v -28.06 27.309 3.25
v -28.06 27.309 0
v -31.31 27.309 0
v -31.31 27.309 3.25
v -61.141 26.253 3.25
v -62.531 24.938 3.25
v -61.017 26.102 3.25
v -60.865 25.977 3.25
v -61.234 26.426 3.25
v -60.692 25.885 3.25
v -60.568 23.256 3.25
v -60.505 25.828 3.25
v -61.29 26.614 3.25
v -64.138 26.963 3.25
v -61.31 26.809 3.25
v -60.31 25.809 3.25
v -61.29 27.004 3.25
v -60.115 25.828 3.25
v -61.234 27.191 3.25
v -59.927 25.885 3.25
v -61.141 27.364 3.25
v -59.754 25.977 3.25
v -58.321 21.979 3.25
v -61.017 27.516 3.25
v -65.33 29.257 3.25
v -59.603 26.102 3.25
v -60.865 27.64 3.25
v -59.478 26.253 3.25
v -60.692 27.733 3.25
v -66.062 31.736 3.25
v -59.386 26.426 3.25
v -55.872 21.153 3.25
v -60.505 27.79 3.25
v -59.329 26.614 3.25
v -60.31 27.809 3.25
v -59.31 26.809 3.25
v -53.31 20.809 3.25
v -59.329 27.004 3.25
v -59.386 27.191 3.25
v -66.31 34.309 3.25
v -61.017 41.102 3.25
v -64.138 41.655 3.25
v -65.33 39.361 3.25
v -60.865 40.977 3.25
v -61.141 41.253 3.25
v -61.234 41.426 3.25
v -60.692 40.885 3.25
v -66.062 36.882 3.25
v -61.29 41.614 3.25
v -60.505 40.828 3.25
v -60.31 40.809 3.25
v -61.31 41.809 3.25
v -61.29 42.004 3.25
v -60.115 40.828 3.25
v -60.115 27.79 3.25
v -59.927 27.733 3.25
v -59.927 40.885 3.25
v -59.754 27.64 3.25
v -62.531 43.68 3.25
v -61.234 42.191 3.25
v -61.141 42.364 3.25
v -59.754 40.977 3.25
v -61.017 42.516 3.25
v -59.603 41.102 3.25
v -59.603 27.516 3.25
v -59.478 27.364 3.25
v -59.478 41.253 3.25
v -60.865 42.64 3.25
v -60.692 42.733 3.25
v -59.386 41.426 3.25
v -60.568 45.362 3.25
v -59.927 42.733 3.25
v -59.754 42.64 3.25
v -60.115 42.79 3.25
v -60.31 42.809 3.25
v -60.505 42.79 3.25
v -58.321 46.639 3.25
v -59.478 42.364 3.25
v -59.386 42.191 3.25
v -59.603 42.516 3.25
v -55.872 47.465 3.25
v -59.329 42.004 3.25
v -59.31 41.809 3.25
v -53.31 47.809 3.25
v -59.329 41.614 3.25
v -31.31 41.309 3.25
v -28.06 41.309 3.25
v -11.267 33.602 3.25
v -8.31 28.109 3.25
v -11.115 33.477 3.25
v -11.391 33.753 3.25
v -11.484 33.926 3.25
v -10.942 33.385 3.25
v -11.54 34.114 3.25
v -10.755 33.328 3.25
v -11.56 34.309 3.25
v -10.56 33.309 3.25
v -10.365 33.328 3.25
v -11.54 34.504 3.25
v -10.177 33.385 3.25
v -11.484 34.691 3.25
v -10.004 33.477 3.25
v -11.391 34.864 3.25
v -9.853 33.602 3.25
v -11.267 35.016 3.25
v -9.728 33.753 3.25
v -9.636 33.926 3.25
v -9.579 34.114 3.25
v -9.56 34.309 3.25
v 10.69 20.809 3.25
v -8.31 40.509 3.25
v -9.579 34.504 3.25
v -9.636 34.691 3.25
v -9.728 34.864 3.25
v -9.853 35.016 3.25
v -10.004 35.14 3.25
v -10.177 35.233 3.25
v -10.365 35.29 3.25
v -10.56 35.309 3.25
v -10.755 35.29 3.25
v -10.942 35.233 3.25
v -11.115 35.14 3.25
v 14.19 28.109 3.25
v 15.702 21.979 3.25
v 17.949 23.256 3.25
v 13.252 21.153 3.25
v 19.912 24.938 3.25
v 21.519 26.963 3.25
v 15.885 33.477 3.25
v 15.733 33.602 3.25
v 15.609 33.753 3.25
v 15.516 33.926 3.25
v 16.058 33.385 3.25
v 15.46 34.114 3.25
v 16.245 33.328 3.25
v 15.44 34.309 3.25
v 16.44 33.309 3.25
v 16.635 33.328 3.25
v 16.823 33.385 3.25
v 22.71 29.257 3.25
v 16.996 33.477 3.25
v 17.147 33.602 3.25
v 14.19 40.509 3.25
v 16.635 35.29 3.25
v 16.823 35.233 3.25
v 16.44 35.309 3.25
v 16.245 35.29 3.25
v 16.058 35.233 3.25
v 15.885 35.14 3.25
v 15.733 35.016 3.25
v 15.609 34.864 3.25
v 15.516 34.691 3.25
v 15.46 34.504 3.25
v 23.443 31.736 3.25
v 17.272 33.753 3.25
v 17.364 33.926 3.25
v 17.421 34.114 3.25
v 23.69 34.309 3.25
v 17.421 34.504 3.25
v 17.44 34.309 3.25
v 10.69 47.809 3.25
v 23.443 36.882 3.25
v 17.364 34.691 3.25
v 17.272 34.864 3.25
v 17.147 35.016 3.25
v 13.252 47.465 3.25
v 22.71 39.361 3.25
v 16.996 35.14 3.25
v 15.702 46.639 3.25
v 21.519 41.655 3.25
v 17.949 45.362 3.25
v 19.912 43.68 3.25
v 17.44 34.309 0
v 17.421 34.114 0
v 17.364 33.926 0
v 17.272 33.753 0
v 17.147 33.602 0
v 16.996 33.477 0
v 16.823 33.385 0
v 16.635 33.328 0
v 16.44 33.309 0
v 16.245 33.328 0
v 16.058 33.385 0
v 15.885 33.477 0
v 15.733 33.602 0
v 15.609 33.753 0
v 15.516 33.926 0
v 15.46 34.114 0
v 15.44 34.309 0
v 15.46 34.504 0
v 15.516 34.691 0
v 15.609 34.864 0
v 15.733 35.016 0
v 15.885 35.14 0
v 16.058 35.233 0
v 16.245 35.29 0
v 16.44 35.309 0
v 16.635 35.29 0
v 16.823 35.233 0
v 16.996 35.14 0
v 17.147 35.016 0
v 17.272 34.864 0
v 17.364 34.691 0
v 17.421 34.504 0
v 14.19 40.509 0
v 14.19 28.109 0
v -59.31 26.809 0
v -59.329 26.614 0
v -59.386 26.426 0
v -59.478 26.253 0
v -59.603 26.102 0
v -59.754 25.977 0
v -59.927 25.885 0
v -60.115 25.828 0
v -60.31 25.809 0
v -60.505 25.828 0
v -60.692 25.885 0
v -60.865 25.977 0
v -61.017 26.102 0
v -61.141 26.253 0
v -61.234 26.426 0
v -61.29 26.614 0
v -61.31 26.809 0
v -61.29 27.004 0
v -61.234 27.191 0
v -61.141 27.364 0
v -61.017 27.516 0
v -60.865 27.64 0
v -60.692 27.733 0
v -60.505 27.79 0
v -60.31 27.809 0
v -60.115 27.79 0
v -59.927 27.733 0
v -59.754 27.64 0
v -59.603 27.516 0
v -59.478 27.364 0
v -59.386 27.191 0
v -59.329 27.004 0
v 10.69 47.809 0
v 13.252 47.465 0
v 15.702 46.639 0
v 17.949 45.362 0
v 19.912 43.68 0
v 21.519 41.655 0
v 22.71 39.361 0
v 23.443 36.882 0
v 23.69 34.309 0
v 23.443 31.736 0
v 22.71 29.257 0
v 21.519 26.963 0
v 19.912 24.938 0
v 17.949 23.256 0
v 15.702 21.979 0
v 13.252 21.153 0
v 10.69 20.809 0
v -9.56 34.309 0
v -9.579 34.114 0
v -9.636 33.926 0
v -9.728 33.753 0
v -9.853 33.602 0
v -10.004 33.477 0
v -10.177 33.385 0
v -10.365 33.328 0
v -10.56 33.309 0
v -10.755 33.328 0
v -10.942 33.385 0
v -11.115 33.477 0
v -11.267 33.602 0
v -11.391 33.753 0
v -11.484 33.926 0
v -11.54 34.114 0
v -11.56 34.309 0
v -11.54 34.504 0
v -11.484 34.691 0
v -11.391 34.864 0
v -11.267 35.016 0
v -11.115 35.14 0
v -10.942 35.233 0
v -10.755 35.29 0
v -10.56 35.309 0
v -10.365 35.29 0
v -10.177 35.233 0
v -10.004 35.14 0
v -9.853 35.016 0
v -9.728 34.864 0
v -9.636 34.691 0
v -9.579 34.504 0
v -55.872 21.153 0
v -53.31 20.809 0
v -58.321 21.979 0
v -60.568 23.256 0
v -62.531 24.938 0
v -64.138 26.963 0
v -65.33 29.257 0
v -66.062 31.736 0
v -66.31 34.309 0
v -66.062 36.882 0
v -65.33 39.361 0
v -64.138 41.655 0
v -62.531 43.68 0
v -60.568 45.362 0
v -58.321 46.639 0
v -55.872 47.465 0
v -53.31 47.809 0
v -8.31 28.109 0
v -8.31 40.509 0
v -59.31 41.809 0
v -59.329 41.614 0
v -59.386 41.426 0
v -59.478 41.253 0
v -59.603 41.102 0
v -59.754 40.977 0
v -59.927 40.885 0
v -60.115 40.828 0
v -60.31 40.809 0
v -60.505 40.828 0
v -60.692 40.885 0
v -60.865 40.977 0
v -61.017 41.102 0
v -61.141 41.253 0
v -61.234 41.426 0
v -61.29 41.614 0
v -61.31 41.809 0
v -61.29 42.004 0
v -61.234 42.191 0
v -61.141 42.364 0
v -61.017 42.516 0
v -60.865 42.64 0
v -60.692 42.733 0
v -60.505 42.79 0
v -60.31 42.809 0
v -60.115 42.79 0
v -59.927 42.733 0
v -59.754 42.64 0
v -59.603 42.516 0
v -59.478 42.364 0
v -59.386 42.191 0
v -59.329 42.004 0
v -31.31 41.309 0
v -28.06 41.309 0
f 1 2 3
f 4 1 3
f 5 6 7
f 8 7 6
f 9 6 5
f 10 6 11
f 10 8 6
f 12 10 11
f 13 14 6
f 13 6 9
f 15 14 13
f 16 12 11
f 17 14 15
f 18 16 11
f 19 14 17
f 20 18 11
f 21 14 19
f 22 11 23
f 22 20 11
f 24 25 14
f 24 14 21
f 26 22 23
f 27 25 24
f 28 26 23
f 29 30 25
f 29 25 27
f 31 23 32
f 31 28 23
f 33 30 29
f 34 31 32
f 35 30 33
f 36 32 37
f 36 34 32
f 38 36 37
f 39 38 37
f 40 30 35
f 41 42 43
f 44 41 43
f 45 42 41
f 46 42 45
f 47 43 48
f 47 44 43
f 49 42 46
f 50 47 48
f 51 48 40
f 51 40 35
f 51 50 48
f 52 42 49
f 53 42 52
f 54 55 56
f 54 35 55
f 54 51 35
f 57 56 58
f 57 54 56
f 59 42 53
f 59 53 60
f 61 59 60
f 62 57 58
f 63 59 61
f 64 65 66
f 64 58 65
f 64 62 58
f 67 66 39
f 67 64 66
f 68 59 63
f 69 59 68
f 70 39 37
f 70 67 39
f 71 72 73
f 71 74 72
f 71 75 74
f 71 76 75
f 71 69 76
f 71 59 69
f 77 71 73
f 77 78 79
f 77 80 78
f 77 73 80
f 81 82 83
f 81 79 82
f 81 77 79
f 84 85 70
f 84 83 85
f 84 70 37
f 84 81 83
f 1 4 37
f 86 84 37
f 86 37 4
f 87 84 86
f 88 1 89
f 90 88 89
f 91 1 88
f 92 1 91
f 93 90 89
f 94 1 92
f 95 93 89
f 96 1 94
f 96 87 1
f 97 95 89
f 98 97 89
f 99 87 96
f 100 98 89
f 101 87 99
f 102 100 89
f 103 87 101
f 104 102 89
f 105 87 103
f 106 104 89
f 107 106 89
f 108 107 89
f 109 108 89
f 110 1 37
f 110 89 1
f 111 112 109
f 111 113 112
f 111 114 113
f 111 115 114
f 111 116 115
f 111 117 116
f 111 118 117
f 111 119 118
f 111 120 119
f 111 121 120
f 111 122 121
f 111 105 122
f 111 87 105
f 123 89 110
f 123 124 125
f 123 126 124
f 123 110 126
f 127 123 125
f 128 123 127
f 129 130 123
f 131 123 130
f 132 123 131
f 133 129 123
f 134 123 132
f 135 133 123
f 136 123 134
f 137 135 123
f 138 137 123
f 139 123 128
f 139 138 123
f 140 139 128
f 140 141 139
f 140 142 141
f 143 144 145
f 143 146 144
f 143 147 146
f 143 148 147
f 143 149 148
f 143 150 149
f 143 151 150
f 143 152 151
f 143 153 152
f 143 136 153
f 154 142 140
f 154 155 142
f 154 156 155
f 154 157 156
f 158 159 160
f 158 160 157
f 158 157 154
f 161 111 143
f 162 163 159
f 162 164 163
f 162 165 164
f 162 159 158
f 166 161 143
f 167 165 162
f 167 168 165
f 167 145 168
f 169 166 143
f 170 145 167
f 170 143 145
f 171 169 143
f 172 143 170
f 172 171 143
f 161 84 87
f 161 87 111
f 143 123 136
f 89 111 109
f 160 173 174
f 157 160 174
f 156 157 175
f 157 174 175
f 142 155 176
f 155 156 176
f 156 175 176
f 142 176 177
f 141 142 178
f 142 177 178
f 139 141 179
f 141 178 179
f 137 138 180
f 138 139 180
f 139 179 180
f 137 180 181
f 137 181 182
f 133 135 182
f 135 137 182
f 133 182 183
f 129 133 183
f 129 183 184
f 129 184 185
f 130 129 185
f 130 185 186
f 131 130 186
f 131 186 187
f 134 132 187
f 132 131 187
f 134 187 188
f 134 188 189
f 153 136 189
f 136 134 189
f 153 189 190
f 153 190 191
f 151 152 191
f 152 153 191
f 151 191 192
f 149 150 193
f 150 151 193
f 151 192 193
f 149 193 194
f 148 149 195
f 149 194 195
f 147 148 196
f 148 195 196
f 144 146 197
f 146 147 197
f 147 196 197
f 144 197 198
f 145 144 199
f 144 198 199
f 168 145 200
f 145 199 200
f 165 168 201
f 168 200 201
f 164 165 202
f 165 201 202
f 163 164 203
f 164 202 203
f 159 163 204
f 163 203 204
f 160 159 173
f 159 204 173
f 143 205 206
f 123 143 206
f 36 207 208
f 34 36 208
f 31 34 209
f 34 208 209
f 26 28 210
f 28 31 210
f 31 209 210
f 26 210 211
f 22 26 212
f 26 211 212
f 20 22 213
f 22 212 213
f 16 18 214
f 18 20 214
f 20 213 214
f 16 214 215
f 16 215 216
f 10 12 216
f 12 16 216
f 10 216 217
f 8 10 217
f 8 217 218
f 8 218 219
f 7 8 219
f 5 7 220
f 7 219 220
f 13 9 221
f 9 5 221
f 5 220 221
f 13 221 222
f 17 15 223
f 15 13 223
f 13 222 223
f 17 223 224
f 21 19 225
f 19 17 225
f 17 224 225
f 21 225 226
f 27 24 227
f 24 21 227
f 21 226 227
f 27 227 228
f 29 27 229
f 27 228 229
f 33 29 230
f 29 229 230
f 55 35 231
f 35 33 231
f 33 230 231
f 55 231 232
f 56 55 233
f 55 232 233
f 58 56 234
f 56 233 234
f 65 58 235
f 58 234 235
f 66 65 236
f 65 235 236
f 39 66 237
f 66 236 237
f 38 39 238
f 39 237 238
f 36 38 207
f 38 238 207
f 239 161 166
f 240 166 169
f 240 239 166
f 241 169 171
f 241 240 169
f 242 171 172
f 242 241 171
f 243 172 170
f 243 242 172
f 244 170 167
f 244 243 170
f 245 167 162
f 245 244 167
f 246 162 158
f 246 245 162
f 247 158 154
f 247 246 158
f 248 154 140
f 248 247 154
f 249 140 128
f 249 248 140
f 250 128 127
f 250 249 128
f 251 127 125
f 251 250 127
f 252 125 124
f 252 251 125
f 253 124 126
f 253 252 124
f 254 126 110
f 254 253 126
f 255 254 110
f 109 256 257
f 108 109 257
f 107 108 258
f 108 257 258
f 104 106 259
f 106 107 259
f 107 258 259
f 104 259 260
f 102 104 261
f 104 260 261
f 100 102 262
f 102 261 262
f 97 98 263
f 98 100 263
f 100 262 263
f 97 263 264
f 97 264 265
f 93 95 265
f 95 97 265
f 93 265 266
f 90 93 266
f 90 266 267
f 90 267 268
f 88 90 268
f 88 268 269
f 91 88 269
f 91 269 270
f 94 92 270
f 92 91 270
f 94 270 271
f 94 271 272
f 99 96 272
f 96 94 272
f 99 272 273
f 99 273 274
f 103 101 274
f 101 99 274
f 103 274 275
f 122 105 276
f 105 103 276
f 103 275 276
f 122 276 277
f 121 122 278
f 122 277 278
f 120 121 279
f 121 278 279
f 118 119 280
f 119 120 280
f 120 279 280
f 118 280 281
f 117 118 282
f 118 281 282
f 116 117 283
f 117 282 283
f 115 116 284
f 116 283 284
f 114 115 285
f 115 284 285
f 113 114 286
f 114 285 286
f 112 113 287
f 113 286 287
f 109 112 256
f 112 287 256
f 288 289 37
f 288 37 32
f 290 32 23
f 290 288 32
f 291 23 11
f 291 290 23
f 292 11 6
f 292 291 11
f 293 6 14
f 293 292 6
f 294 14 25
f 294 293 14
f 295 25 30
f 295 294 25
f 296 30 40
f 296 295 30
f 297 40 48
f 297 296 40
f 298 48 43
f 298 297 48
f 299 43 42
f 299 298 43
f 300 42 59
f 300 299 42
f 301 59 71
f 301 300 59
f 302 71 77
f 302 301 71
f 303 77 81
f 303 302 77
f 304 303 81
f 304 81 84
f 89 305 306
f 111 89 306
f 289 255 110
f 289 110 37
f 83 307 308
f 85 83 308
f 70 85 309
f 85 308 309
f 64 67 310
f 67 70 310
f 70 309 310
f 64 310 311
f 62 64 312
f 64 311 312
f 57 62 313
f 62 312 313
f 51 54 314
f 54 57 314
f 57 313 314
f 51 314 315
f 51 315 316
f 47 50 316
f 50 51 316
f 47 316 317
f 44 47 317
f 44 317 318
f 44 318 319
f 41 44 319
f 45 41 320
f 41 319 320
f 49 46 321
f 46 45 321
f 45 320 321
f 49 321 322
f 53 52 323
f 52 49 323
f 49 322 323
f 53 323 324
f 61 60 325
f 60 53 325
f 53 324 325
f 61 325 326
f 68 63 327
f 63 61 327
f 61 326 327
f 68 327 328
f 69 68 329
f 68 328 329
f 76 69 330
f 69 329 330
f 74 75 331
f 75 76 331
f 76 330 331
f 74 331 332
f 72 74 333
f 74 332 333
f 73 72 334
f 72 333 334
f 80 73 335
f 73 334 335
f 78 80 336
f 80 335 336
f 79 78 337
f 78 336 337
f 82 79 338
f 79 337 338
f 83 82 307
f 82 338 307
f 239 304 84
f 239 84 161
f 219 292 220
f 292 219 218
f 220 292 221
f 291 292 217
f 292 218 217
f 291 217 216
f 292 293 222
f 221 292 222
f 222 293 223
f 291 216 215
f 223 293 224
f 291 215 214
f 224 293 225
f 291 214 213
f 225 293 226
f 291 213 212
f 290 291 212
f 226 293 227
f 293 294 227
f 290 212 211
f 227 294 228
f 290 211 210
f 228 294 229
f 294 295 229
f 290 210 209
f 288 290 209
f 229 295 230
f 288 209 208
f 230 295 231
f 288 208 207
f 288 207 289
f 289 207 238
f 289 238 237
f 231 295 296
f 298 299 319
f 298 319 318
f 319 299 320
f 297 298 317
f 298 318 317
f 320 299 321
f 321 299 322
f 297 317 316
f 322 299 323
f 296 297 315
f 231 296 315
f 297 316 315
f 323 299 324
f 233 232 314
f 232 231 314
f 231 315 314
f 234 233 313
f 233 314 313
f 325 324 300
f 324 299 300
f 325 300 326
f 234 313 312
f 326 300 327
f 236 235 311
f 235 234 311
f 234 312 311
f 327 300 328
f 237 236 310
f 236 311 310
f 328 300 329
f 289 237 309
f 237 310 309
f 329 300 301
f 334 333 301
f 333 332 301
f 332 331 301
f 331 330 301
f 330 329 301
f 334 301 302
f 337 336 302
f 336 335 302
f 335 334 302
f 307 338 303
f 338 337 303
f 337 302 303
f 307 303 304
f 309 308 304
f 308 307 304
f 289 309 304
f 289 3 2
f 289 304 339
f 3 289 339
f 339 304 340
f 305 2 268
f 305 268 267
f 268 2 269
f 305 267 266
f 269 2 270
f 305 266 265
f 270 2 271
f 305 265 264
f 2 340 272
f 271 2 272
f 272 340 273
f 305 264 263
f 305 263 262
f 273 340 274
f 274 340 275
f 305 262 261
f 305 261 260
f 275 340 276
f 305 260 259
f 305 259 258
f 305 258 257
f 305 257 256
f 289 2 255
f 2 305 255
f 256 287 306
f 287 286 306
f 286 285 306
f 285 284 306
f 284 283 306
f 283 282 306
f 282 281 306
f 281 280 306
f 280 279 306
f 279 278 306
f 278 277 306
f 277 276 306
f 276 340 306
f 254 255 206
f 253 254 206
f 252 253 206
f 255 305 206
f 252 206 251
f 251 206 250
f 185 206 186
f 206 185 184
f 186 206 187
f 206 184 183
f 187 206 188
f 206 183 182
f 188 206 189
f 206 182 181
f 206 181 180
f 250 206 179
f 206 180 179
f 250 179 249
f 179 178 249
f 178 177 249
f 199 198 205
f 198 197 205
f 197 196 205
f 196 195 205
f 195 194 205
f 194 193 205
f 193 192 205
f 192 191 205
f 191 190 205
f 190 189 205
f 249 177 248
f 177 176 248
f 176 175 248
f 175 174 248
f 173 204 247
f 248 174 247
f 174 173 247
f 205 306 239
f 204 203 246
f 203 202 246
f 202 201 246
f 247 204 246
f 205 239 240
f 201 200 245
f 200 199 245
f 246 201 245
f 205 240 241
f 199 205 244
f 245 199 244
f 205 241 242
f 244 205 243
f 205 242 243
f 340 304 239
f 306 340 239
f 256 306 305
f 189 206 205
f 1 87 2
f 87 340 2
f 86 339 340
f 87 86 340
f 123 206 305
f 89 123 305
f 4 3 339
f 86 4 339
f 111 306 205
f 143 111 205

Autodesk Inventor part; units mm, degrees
ref_plane "YZ Plane" through (0, 0, 0) normal (1, 0, 0) x (0, 1, 0)
ref_plane "XZ Plane" through (0, 0, 0) normal (0, 1, 0) x (-1, 0, 0)
ref_plane "XY Plane" through (0, 0, 0) normal (0, 0, 1) x (1, 0, 0)
sketch "Block1" plane through (0, 0, 0) normal (0, 0, 1) x (1, 0, 0)
  circle A0 centre (74.029, 24.2723) radius 1
  line L0 (49.279, 30.4723) -> (71.779, 30.4723)
  line L1 (71.779, 30.4723) -> (71.779, 18.0723)
  line L2 (71.779, 18.0723) -> (49.279, 18.0723)
  line L3 (49.279, 18.0723) -> (49.279, 30.4723)
  line L4 (49.279, 30.4723) -> (44.779, 30.4723)
  line L5 (44.779, 30.4723) -> (44.779, 18.0723)
  line L6 (44.779, 18.0723) -> (49.279, 18.0723)
  line L7 (49.279, 18.0723) -> (49.279, 30.4723)
  line L8 (71.779, 30.4723) -> (76.279, 30.4723)
  line L9 (76.279, 30.4723) -> (76.279, 18.0723)
  line L10 (76.279, 18.0723) -> (71.779, 18.0723)
  line L11 (71.779, 18.0723) -> (71.779, 30.4723)
  line L12 (44.779, 24.2723) -> (76.279, 24.2723) construction
  line L13 (47.029, 30.4723) -> (47.029, 18.0723) construction
  circle A1 centre (47.029, 24.2723) radius 1
  line L14 (74.029, 30.4723) -> (74.029, 18.0723) construction
  point P0 (60.979, 24.0984)
  dimension "d7" = 22.5
  dimension "d8" = 12.4
  dimension "d9" = 4.5
  dimension "d10" = 4.5
  dimension "d11" = 2
  dimension "d12" = 2
sketch "Sketch1" plane through (0, 0, 0) normal (0, 0, 1) x (1, 0, 0)
  line L0 (-92.7646, -8.503) -> (-89.7646, -8.503)
  line L1 (-89.7646, -8.503) -> (-89.7646, -11.753)
  line L2 (-89.7646, -11.753) -> (-92.7646, -11.753)
  line L3 (-92.7646, -11.753) -> (-92.7646, -8.503)
  line L4 (-92.7646, -21.6527) -> (-89.7646, -21.6527)
  line L5 (-89.7646, -21.6527) -> (-89.7646, -21.7527)
  line L6 (-89.7646, -21.7527) -> (-92.7646, -21.7527)
  line L7 (-92.7646, -21.7527) -> (-92.7646, -21.6527)
  line L8 (-66.3097, 47.8088) -> (23.6903, 47.8088)
  line L9 (23.6903, 47.8088) -> (23.6903, 20.8088)
  line L10 (23.6903, 20.8088) -> (-66.3097, 20.8088)
  line L11 (-66.3097, 20.8088) -> (-66.3097, 47.8088)
  line L12 (-66.3097, 34.3088) -> (23.6903, 34.3088) construction
  circle A0 centre (-60.3097, 41.8088) radius 1
  circle A1 centre (-60.3097, 26.8088) radius 1
  line L13 (-31.3097, 41.3088) -> (-28.0597, 41.3088)
  line L14 (-28.0597, 41.3088) -> (-28.0597, 27.3088)
  line L15 (-28.0597, 27.3088) -> (-31.3097, 27.3088)
  line L16 (-31.3097, 27.3088) -> (-31.3097, 41.3088)
  line L17 (-31.3097, 34.3088) -> (-28.0597, 34.3088) construction
  line L18 (-53.3097, 47.8088) -> (-53.3097, 20.8088) construction
  line L19 (-21.3097, 47.8088) -> (-21.3097, 20.8088) construction
  line L20 (10.6903, 47.8088) -> (10.6903, 20.8088) construction
  arc A2 (-53.3097, 47.8088) -> (-53.3097, 20.8088) centre (-52.8001, 34.3088) ccw
  arc A3 (10.6903, 20.8088) -> (10.6903, 47.8088) centre (10.1806, 34.3088) ccw
  circle A4 centre (-10.5597, 34.3088) radius 1
  line L21 (14.1903, 28.1088) -> (-8.3097, 28.1088)
  line L22 (-8.3097, 28.1088) -> (-8.3097, 40.5088)
  line L23 (-8.3097, 40.5088) -> (14.1903, 40.5088)
  line L24 (14.1903, 40.5088) -> (14.1903, 28.1088)
  line L25 (14.1903, 28.1088) -> (18.6903, 28.1088)
  line L26 (18.6903, 28.1088) -> (18.6903, 40.5088)
  line L27 (18.6903, 40.5088) -> (14.1903, 40.5088)
  line L28 (14.1903, 40.5088) -> (14.1903, 28.1088)
  line L29 (-8.3097, 28.1088) -> (-12.8097, 28.1088)
  line L30 (-12.8097, 28.1088) -> (-12.8097, 40.5088)
  line L31 (-12.8097, 40.5088) -> (-8.3097, 40.5088)
  line L32 (-8.3097, 40.5088) -> (-8.3097, 28.1088)
  line L33 (18.6903, 34.3088) -> (-12.8097, 34.3088) construction
  line L34 (16.4403, 28.1088) -> (16.4403, 40.5088) construction
  circle A5 centre (16.4403, 34.3088) radius 1
  line L35 (-10.5597, 28.1088) -> (-10.5597, 40.5088) construction
  point P0 (0, 0)
  dimension "d0" = 3
  dimension "mat" = 3.25
  dimension "d2" = 3
  dimension "d3" = 0.1
  dimension "d23" = 90
  dimension "d24" = 27
  dimension "d25" = 5
  dimension "d26" = 2
  dimension "d27" = 5
  dimension "d28" = 5
  dimension "d29" = 3.25
  dimension "d30" = 14
  dimension "d31" = 35
  dimension "d36" = 13
  dimension "d38" = 13
extrude "Extrusion4" add sketch "Sketch1" along normal blind 3.25 contours L8 A3 L10 A2 | L24 L27 L26 L25 | L29 L30 L31 L22
equation "\"d29\" = mat"
equation "\"d40\" = mat"
properties part number "arm-servo"
